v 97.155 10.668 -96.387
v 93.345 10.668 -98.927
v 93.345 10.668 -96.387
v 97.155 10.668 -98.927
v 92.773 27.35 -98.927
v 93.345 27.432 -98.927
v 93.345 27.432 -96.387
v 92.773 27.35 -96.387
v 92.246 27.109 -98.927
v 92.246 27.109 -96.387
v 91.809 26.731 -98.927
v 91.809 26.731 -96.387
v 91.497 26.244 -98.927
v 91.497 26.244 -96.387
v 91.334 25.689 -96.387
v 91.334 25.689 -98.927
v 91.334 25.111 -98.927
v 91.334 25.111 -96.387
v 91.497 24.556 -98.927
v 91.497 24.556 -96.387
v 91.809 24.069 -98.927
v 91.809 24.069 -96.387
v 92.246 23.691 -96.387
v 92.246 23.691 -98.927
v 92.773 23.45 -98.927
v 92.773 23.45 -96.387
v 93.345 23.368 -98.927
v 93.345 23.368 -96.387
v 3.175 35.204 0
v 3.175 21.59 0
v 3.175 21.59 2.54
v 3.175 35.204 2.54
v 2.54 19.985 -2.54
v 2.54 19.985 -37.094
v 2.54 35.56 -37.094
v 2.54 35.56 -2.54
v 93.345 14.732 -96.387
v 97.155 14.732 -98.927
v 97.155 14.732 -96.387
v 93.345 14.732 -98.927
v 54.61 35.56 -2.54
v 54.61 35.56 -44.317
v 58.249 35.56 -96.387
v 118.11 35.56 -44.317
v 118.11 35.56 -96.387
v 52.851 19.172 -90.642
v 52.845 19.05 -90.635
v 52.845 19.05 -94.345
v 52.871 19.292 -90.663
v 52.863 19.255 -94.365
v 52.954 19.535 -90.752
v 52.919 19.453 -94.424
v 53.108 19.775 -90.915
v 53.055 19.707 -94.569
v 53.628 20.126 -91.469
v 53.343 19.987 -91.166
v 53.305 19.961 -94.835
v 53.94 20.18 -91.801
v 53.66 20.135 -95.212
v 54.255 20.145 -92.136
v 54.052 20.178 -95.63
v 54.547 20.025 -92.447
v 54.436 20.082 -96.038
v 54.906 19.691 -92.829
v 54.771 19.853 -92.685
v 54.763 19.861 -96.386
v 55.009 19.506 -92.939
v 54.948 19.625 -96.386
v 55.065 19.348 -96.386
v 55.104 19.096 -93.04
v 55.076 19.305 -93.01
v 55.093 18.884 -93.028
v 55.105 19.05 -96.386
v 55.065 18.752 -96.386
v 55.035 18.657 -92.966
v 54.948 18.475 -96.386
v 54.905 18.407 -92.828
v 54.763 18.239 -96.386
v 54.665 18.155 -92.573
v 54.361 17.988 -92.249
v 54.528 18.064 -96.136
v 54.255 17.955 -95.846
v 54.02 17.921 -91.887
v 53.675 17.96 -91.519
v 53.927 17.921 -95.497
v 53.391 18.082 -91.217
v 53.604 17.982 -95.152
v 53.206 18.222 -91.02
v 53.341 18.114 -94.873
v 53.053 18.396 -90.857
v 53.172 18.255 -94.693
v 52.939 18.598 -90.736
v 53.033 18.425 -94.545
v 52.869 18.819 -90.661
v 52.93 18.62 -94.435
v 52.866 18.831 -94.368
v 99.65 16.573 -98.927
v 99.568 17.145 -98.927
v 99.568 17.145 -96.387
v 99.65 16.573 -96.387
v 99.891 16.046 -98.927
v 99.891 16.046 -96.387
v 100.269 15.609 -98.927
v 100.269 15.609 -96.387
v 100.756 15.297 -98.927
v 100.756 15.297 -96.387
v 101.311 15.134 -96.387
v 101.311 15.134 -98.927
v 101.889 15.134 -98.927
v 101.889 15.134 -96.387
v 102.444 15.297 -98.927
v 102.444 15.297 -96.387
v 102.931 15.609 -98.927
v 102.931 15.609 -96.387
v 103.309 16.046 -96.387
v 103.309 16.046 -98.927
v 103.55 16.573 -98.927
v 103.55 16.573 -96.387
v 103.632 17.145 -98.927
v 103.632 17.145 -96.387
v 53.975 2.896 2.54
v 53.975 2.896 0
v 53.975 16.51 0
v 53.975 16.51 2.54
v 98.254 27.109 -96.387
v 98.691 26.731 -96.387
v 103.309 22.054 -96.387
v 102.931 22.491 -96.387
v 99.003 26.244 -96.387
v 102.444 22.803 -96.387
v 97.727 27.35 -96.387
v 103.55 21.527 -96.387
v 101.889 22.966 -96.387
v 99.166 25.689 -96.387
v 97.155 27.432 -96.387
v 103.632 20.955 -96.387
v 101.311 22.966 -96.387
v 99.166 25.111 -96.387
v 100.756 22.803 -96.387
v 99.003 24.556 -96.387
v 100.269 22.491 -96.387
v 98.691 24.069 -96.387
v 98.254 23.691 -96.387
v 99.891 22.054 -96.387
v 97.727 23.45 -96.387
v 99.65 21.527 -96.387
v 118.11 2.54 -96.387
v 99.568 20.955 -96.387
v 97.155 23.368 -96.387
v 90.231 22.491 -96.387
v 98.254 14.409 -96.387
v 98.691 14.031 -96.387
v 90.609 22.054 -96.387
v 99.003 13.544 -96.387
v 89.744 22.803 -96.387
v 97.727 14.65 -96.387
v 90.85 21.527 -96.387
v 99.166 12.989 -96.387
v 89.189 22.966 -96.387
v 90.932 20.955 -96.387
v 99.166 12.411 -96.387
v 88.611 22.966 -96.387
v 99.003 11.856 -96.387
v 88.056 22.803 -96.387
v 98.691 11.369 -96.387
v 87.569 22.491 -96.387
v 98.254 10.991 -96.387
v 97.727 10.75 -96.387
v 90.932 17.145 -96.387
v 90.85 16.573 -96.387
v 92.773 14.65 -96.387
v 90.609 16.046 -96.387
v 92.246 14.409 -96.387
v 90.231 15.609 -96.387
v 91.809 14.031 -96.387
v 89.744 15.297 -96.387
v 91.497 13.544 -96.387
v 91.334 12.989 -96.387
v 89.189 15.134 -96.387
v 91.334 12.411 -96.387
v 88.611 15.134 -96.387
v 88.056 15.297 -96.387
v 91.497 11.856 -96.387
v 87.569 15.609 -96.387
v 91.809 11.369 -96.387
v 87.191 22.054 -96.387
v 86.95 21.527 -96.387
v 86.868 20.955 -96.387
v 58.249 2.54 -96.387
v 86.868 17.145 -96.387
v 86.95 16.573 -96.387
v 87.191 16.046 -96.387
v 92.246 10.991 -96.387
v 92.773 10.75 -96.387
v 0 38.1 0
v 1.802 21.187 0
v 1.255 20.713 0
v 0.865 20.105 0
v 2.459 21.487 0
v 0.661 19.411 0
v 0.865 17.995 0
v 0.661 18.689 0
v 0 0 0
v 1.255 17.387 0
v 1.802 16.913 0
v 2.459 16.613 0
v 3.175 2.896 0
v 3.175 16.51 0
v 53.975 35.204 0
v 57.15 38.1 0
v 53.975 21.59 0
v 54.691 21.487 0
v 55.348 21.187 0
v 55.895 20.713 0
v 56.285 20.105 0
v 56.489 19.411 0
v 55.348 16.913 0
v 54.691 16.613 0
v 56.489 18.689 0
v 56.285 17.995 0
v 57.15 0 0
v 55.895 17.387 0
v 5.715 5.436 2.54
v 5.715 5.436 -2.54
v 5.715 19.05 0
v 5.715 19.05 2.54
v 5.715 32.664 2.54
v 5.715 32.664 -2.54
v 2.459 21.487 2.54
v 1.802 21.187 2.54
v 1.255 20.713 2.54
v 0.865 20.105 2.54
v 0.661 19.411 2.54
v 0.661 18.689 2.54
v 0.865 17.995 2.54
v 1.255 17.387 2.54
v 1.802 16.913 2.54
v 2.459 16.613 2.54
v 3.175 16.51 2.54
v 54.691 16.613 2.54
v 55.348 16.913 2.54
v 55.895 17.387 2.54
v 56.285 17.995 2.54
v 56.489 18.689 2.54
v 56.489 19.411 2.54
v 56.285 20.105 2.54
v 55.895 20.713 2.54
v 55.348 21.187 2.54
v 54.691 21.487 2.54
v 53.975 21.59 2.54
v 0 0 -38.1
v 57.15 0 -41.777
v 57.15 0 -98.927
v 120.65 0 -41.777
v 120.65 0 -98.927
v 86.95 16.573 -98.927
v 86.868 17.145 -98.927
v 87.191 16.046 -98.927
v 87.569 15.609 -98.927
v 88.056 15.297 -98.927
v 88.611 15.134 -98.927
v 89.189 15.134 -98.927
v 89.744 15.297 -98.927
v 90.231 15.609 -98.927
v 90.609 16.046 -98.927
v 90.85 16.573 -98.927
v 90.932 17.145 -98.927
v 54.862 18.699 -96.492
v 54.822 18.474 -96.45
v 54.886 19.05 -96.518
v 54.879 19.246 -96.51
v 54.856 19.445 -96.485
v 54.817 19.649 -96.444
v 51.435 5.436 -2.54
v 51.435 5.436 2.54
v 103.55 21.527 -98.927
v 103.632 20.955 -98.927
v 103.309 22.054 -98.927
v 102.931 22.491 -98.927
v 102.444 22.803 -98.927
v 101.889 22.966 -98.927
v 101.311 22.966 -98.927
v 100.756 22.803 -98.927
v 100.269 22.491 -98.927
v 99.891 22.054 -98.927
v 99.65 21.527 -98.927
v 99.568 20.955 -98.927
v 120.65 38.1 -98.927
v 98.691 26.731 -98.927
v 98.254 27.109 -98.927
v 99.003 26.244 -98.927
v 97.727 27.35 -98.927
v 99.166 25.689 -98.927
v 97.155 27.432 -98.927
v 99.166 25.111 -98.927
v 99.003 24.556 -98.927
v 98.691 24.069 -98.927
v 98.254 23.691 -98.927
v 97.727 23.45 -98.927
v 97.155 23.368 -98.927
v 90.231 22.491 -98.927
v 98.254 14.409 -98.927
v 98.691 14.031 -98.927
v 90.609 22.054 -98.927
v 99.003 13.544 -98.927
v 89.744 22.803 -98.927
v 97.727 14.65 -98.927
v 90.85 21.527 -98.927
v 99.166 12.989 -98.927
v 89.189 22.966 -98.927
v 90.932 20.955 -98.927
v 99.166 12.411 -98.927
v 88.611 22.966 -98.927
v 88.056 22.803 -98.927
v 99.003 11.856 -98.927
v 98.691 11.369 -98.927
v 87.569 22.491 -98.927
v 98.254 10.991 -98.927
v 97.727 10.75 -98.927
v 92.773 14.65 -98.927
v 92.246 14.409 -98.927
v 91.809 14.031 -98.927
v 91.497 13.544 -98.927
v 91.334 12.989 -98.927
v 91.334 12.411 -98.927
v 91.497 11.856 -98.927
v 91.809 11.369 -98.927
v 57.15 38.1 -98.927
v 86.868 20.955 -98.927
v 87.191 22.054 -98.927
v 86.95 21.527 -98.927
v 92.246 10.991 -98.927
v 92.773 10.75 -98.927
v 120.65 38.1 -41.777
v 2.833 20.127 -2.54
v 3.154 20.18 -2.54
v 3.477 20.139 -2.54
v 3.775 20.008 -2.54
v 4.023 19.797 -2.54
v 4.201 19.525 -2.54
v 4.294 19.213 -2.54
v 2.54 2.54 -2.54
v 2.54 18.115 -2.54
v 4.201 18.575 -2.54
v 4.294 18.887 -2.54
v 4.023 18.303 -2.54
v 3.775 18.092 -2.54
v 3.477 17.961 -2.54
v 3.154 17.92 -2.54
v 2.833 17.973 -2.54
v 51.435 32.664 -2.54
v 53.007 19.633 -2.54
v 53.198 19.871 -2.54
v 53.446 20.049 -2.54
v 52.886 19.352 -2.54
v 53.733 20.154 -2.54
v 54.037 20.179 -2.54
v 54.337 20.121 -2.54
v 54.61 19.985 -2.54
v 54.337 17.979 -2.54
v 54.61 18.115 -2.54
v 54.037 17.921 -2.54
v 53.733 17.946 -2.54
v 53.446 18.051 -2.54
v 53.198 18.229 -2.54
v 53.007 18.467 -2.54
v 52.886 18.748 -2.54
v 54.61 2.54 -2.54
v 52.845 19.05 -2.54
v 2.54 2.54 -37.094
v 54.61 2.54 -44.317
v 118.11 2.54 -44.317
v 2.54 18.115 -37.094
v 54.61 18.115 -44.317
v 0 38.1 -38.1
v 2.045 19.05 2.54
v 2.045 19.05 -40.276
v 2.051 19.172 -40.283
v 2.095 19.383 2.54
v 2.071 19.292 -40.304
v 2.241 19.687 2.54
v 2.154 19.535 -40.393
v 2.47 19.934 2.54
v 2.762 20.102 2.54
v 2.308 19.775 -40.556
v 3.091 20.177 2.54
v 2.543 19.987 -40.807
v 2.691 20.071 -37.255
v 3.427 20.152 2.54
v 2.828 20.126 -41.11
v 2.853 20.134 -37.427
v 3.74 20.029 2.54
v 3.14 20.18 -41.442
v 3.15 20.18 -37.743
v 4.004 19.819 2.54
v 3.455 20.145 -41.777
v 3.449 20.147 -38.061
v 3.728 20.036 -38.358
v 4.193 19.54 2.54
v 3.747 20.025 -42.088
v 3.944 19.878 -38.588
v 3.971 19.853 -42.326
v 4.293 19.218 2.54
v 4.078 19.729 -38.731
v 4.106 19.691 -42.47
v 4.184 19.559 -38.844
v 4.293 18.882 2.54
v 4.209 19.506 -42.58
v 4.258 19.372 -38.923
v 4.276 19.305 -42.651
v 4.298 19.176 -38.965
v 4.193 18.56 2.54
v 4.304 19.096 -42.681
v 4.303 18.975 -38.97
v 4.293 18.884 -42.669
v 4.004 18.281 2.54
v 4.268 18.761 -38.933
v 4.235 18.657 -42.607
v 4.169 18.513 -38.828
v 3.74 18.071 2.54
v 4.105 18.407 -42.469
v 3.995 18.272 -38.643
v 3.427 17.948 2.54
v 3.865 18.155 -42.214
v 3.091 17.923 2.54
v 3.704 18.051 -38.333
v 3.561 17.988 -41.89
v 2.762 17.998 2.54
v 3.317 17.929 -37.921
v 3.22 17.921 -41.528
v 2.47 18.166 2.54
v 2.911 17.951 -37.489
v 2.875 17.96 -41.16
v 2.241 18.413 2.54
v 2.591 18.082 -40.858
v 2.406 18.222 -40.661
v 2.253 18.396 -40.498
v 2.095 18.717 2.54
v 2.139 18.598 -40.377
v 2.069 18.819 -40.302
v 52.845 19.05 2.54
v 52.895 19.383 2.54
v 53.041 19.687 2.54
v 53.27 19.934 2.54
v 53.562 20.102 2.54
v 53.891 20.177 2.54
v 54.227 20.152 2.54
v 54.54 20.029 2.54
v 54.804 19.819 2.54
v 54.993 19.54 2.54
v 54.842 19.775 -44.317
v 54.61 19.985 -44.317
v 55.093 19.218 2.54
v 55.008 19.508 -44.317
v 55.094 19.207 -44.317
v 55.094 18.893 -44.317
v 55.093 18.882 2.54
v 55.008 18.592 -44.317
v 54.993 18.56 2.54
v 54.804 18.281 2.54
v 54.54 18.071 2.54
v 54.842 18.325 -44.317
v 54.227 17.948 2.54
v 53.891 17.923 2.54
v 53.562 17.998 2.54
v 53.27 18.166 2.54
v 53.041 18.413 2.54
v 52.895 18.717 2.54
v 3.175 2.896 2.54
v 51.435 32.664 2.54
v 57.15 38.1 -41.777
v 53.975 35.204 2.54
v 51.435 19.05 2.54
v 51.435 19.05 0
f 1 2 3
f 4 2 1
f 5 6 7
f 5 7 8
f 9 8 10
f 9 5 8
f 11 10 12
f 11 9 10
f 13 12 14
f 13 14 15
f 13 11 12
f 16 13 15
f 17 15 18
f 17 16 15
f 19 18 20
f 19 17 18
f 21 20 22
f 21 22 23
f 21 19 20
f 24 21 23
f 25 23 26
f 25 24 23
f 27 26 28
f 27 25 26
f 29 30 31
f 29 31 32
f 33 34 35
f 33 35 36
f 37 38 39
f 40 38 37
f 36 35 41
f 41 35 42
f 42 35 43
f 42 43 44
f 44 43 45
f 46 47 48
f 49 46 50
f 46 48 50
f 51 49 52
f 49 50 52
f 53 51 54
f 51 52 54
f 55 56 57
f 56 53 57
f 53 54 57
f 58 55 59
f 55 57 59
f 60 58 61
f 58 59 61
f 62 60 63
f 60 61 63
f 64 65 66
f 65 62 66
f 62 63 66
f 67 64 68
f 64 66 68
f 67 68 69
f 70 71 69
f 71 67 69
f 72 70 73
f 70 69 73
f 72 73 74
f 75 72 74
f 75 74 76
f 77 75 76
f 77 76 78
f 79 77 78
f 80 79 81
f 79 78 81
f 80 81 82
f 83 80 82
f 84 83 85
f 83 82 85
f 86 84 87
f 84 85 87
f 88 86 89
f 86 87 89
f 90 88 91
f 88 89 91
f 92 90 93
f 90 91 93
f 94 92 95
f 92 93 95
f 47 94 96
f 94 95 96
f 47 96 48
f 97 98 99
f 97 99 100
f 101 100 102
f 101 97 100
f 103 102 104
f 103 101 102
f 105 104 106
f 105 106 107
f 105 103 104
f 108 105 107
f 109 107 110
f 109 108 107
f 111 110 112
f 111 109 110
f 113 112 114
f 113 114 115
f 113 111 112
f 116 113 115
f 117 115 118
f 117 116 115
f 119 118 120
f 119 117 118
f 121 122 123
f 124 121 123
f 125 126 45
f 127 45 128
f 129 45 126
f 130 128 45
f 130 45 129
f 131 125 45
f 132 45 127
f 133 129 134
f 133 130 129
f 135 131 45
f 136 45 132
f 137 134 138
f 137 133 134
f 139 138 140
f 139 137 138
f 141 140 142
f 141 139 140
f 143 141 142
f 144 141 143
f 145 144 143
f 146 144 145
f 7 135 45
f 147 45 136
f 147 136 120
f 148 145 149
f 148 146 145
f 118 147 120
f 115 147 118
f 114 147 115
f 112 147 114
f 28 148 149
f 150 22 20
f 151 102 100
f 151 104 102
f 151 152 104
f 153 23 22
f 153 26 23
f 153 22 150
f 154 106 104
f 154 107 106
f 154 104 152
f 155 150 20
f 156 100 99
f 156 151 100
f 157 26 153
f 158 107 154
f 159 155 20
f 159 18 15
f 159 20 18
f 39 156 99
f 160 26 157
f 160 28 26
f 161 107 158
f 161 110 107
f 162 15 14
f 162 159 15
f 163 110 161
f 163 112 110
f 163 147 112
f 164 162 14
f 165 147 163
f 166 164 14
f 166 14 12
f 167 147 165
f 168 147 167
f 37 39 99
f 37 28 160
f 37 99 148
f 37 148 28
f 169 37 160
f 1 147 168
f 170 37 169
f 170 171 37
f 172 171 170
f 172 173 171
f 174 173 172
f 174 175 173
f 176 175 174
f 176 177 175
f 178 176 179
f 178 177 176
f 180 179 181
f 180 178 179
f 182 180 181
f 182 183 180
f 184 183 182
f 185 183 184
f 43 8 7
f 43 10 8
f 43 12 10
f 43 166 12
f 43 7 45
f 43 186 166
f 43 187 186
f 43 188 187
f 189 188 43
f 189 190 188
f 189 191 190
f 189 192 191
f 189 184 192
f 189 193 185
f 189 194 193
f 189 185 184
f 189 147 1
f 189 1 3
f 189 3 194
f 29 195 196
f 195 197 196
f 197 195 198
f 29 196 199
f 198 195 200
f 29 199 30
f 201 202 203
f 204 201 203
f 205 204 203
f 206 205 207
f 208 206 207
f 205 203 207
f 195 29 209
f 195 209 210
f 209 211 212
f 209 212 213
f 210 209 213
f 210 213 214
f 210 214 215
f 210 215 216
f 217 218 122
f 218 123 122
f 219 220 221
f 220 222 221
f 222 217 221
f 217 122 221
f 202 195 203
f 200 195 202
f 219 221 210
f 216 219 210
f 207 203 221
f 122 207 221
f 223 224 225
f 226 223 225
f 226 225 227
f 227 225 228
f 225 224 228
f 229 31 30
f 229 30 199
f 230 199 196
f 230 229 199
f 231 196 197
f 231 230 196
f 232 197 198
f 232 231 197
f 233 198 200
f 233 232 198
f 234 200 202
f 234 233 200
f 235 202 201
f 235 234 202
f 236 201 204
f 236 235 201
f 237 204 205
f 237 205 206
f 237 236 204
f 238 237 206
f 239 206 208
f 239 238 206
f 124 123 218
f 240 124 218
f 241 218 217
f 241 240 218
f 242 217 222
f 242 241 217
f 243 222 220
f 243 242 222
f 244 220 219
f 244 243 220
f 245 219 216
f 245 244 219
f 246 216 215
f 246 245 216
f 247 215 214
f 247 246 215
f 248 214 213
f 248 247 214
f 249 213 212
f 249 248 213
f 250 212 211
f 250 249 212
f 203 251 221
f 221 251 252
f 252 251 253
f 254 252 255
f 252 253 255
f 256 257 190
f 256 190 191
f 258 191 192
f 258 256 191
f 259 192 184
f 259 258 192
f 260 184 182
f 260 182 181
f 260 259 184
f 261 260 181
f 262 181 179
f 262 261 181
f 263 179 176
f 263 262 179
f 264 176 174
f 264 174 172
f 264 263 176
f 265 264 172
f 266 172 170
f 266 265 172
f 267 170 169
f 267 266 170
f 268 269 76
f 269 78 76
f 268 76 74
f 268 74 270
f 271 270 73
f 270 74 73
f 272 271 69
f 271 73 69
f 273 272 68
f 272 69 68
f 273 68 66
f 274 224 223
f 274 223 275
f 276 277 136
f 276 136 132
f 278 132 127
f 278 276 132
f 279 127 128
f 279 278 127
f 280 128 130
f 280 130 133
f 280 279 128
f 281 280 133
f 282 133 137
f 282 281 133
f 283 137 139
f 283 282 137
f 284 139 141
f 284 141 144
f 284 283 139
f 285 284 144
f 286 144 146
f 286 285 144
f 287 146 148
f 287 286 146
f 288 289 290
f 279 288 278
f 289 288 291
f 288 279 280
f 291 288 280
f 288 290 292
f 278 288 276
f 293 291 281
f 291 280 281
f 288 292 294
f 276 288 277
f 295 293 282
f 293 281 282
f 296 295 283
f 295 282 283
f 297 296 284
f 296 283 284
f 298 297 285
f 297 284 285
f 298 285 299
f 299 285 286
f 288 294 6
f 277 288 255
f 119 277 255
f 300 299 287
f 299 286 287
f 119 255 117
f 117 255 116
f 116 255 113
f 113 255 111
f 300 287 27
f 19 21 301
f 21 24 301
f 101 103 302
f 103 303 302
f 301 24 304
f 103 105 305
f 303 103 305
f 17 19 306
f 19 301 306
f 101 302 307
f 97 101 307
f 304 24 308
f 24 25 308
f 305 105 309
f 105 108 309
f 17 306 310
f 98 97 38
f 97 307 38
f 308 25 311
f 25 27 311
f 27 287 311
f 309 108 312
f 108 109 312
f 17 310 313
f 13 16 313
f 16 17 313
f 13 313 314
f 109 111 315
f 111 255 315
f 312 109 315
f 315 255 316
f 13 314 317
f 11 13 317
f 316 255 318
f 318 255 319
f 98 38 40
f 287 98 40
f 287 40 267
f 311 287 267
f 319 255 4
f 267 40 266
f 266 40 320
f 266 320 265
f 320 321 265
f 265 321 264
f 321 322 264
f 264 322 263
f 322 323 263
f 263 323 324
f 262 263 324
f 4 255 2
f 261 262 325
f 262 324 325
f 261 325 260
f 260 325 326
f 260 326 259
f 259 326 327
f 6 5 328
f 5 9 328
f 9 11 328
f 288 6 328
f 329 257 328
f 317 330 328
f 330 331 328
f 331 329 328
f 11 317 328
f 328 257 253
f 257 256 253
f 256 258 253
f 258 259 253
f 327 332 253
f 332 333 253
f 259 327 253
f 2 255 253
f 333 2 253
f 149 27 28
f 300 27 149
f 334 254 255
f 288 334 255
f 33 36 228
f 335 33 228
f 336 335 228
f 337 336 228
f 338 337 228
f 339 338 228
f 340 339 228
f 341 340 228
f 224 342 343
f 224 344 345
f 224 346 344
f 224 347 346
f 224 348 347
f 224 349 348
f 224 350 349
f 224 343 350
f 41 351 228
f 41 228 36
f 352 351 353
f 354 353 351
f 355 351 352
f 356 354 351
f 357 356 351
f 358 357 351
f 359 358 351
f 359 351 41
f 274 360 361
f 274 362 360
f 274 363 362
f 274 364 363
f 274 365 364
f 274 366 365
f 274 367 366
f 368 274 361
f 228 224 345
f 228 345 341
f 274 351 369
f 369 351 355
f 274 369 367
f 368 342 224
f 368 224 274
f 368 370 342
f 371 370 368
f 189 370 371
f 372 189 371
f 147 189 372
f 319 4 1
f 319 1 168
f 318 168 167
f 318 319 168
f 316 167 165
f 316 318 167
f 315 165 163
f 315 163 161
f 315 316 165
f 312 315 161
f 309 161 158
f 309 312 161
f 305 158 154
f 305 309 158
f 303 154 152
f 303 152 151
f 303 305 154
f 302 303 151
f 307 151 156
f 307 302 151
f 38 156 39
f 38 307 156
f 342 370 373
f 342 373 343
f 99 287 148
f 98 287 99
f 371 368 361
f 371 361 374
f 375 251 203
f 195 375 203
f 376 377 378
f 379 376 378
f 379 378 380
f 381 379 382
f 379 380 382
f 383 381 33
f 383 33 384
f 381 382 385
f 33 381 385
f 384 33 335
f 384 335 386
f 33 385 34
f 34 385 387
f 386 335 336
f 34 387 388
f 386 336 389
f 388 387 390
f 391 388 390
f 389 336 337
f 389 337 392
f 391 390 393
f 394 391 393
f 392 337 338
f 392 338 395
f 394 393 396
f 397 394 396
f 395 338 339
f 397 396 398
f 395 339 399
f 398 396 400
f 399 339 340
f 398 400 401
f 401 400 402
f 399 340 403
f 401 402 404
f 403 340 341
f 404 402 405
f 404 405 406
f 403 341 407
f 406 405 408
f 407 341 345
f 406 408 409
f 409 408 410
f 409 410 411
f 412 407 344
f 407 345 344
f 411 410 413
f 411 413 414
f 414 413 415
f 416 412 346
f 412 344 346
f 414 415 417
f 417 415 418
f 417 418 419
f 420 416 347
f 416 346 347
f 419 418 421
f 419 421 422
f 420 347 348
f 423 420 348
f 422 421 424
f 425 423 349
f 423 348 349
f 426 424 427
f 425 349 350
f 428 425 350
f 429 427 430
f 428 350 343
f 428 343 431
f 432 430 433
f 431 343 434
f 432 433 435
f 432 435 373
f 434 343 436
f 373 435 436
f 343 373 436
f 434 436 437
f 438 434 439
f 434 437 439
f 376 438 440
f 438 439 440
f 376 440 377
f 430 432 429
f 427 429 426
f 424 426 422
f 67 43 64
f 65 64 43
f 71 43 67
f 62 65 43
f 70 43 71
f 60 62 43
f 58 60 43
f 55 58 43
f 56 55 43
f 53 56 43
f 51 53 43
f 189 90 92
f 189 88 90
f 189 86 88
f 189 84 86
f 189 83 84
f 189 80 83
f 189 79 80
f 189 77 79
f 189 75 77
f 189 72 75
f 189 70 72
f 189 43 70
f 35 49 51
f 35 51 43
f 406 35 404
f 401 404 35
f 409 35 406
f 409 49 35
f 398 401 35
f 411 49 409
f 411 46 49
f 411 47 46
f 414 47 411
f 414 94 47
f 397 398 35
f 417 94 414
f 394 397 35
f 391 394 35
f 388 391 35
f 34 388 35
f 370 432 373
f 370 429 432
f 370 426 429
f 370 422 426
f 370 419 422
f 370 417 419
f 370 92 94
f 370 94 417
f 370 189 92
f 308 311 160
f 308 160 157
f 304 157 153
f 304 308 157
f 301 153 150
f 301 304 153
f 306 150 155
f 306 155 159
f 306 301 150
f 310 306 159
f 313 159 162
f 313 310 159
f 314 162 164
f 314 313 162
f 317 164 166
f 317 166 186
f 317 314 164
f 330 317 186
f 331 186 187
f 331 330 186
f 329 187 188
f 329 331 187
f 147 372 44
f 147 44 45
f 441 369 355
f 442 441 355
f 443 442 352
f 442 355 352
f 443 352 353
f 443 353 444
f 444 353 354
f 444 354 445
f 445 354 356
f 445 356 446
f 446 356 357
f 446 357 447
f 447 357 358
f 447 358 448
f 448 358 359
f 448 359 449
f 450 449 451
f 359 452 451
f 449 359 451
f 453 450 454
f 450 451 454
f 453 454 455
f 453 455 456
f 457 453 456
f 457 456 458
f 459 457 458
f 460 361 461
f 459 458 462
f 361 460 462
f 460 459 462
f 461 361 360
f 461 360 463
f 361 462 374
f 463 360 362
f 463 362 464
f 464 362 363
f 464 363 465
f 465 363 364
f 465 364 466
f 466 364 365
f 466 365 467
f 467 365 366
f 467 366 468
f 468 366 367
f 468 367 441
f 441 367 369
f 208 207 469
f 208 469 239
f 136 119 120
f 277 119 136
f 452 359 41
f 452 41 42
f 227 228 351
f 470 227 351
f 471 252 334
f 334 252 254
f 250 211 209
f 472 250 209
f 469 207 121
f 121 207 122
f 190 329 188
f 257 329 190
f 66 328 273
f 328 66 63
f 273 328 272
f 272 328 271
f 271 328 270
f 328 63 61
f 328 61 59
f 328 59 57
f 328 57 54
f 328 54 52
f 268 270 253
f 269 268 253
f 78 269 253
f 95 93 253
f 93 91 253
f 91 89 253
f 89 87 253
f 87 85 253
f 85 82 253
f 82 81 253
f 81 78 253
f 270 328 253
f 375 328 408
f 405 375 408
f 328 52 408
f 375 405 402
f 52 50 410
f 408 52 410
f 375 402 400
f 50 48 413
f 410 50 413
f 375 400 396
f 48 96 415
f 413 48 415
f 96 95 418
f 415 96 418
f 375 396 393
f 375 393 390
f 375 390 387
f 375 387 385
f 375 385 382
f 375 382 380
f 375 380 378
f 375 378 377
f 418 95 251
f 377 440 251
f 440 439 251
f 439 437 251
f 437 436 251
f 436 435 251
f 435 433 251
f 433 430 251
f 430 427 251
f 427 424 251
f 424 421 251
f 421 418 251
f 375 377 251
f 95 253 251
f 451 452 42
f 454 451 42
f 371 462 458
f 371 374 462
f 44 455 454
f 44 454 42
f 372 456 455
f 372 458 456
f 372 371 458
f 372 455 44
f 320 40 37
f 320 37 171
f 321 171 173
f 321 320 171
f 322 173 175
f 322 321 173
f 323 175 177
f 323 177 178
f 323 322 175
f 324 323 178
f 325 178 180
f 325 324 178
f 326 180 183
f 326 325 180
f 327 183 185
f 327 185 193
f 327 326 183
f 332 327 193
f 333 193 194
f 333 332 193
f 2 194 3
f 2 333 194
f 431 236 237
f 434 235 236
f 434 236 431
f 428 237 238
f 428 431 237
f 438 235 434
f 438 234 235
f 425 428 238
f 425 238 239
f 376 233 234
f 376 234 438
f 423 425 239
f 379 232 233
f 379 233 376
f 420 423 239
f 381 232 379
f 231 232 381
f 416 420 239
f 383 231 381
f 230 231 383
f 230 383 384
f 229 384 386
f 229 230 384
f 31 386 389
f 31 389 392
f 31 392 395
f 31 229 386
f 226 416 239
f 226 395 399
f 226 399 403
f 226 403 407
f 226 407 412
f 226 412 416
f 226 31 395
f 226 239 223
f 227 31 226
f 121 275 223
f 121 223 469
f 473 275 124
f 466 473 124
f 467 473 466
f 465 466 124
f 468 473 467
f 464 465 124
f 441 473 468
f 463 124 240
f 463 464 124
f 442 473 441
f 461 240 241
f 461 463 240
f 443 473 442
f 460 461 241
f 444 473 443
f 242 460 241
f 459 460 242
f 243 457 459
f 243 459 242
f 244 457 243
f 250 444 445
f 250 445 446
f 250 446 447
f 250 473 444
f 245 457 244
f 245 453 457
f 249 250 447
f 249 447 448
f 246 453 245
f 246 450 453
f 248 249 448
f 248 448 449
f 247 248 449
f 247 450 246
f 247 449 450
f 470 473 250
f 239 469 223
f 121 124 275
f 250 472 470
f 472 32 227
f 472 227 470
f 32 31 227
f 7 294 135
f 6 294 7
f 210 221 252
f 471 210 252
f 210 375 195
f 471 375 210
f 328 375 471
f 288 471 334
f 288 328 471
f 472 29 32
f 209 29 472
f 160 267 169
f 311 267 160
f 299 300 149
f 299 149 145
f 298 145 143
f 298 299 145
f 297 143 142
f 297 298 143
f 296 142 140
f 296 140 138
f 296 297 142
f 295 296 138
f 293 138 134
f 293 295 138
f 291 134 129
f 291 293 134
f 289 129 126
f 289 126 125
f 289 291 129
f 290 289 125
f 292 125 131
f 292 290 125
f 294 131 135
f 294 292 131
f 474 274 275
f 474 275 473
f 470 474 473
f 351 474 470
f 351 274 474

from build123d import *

# Parameters (mm, degrees)
BOSS_EXTRUDE1_DEPTH       = 38.1
SKETCH3_W                 = 50.8
SKETCH3_H                 = 32.3088
BOSS_EXTRUDE2_DEPTH       = 2.54
SHELL2_T                  = -2.54
SKETCH5_R                 = 2.54
BOSS_EXTRUDE3_DEPTH       = 2.54
F_4_40_TAPPED_HOLE1_D     = 2.2606
F_4_40_TAPPED_HOLE1_DEPTH = 98.926014438
F_4_40_TAPPED_HOLE1_TIP   = 0.679152758
CUT_EXTRUDE1_DEPTH        = 2.54
CIRPATTERN1_COUNT         = 4


with BuildPart() as part:
    # Sketch1 → Boss-Extrude1 (new body)
    with BuildSketch(Plane(origin=(0, 0, 0), x_dir=(1, 0, 0), z_dir=(0, 1, 0))):
        Polygon((0, 0), (57.15, 0), (57.15, 41.777014438), (120.65, 41.777014438), (120.65, 98.927014438), (57.15, 98.927014438), (0, 38.1), align=None)
    extrude(amount=BOSS_EXTRUDE1_DEPTH)

    # Sketch3 → Boss-Extrude2 (add)
    with BuildSketch(Plane.XY):
        with Locations((28.575, 19.05)):
            Rectangle(SKETCH3_W, SKETCH3_H)
    extrude(amount=BOSS_EXTRUDE2_DEPTH)

    # Shell2
    shell2_openings = [part.faces().sort_by_distance(p)[0] for p in [
        (28.575, 19.05, 2.54),
    ]]
    offset(amount=SHELL2_T, openings=shell2_openings, kind=Kind.INTERSECTION)

    # Sketch5 → Boss-Extrude3 (add)
    with BuildSketch(Plane.XY.offset(2.54)):
        with Locations((3.175, 19.05)):
            Circle(SKETCH5_R)
        with Locations((53.975, 19.05)):
            Circle(SKETCH5_R)
    extrude(amount=-BOSS_EXTRUDE3_DEPTH)

    # #4-40 Tapped Hole1
    with Locations(Plane(origin=(53.975, 19.05, 2.54), x_dir=(1, 0, 0), z_dir=(0, 0, 1))):
        with Locations((0, 0), (-50.8, 0)):
            Hole(F_4_40_TAPPED_HOLE1_D / 2, depth=F_4_40_TAPPED_HOLE1_DEPTH)
            with Locations((0, 0, -(F_4_40_TAPPED_HOLE1_DEPTH + F_4_40_TAPPED_HOLE1_TIP / 2))):  # 118° drill point
                Cone(0, F_4_40_TAPPED_HOLE1_D / 2, F_4_40_TAPPED_HOLE1_TIP, mode=Mode.SUBTRACT)

    # single button hole → Cut-Extrude1 (cut)
    with BuildSketch(Plane(origin=(0, 0, -98.927014438), x_dir=(-1, 0, 0), z_dir=(0, 0, -1))):
        with BuildLine():
            Line((-93.345, 10.668), (-97.155, 10.668))
            ThreePointArc((-97.155, 10.668), (-99.187, 12.7), (-97.155, 14.732))
            Line((-97.155, 14.732), (-93.345, 14.732))
            ThreePointArc((-93.345, 14.732), (-91.313, 12.7), (-93.345, 10.668))
        make_face()
    cut_extrude1 = extrude(amount=-CUT_EXTRUDE1_DEPTH, mode=Mode.SUBTRACT)

    # CirPattern1: Cut-Extrude1 ×4 about axis
    cirpattern1_axis = Axis((95.25, 19.05, 0), (0, 0, 1))
    for i in range(1, CIRPATTERN1_COUNT):
        add(cut_extrude1.rotate(cirpattern1_axis, i * 360 / CIRPATTERN1_COUNT), mode=Mode.SUBTRACT)


solid = part.part
